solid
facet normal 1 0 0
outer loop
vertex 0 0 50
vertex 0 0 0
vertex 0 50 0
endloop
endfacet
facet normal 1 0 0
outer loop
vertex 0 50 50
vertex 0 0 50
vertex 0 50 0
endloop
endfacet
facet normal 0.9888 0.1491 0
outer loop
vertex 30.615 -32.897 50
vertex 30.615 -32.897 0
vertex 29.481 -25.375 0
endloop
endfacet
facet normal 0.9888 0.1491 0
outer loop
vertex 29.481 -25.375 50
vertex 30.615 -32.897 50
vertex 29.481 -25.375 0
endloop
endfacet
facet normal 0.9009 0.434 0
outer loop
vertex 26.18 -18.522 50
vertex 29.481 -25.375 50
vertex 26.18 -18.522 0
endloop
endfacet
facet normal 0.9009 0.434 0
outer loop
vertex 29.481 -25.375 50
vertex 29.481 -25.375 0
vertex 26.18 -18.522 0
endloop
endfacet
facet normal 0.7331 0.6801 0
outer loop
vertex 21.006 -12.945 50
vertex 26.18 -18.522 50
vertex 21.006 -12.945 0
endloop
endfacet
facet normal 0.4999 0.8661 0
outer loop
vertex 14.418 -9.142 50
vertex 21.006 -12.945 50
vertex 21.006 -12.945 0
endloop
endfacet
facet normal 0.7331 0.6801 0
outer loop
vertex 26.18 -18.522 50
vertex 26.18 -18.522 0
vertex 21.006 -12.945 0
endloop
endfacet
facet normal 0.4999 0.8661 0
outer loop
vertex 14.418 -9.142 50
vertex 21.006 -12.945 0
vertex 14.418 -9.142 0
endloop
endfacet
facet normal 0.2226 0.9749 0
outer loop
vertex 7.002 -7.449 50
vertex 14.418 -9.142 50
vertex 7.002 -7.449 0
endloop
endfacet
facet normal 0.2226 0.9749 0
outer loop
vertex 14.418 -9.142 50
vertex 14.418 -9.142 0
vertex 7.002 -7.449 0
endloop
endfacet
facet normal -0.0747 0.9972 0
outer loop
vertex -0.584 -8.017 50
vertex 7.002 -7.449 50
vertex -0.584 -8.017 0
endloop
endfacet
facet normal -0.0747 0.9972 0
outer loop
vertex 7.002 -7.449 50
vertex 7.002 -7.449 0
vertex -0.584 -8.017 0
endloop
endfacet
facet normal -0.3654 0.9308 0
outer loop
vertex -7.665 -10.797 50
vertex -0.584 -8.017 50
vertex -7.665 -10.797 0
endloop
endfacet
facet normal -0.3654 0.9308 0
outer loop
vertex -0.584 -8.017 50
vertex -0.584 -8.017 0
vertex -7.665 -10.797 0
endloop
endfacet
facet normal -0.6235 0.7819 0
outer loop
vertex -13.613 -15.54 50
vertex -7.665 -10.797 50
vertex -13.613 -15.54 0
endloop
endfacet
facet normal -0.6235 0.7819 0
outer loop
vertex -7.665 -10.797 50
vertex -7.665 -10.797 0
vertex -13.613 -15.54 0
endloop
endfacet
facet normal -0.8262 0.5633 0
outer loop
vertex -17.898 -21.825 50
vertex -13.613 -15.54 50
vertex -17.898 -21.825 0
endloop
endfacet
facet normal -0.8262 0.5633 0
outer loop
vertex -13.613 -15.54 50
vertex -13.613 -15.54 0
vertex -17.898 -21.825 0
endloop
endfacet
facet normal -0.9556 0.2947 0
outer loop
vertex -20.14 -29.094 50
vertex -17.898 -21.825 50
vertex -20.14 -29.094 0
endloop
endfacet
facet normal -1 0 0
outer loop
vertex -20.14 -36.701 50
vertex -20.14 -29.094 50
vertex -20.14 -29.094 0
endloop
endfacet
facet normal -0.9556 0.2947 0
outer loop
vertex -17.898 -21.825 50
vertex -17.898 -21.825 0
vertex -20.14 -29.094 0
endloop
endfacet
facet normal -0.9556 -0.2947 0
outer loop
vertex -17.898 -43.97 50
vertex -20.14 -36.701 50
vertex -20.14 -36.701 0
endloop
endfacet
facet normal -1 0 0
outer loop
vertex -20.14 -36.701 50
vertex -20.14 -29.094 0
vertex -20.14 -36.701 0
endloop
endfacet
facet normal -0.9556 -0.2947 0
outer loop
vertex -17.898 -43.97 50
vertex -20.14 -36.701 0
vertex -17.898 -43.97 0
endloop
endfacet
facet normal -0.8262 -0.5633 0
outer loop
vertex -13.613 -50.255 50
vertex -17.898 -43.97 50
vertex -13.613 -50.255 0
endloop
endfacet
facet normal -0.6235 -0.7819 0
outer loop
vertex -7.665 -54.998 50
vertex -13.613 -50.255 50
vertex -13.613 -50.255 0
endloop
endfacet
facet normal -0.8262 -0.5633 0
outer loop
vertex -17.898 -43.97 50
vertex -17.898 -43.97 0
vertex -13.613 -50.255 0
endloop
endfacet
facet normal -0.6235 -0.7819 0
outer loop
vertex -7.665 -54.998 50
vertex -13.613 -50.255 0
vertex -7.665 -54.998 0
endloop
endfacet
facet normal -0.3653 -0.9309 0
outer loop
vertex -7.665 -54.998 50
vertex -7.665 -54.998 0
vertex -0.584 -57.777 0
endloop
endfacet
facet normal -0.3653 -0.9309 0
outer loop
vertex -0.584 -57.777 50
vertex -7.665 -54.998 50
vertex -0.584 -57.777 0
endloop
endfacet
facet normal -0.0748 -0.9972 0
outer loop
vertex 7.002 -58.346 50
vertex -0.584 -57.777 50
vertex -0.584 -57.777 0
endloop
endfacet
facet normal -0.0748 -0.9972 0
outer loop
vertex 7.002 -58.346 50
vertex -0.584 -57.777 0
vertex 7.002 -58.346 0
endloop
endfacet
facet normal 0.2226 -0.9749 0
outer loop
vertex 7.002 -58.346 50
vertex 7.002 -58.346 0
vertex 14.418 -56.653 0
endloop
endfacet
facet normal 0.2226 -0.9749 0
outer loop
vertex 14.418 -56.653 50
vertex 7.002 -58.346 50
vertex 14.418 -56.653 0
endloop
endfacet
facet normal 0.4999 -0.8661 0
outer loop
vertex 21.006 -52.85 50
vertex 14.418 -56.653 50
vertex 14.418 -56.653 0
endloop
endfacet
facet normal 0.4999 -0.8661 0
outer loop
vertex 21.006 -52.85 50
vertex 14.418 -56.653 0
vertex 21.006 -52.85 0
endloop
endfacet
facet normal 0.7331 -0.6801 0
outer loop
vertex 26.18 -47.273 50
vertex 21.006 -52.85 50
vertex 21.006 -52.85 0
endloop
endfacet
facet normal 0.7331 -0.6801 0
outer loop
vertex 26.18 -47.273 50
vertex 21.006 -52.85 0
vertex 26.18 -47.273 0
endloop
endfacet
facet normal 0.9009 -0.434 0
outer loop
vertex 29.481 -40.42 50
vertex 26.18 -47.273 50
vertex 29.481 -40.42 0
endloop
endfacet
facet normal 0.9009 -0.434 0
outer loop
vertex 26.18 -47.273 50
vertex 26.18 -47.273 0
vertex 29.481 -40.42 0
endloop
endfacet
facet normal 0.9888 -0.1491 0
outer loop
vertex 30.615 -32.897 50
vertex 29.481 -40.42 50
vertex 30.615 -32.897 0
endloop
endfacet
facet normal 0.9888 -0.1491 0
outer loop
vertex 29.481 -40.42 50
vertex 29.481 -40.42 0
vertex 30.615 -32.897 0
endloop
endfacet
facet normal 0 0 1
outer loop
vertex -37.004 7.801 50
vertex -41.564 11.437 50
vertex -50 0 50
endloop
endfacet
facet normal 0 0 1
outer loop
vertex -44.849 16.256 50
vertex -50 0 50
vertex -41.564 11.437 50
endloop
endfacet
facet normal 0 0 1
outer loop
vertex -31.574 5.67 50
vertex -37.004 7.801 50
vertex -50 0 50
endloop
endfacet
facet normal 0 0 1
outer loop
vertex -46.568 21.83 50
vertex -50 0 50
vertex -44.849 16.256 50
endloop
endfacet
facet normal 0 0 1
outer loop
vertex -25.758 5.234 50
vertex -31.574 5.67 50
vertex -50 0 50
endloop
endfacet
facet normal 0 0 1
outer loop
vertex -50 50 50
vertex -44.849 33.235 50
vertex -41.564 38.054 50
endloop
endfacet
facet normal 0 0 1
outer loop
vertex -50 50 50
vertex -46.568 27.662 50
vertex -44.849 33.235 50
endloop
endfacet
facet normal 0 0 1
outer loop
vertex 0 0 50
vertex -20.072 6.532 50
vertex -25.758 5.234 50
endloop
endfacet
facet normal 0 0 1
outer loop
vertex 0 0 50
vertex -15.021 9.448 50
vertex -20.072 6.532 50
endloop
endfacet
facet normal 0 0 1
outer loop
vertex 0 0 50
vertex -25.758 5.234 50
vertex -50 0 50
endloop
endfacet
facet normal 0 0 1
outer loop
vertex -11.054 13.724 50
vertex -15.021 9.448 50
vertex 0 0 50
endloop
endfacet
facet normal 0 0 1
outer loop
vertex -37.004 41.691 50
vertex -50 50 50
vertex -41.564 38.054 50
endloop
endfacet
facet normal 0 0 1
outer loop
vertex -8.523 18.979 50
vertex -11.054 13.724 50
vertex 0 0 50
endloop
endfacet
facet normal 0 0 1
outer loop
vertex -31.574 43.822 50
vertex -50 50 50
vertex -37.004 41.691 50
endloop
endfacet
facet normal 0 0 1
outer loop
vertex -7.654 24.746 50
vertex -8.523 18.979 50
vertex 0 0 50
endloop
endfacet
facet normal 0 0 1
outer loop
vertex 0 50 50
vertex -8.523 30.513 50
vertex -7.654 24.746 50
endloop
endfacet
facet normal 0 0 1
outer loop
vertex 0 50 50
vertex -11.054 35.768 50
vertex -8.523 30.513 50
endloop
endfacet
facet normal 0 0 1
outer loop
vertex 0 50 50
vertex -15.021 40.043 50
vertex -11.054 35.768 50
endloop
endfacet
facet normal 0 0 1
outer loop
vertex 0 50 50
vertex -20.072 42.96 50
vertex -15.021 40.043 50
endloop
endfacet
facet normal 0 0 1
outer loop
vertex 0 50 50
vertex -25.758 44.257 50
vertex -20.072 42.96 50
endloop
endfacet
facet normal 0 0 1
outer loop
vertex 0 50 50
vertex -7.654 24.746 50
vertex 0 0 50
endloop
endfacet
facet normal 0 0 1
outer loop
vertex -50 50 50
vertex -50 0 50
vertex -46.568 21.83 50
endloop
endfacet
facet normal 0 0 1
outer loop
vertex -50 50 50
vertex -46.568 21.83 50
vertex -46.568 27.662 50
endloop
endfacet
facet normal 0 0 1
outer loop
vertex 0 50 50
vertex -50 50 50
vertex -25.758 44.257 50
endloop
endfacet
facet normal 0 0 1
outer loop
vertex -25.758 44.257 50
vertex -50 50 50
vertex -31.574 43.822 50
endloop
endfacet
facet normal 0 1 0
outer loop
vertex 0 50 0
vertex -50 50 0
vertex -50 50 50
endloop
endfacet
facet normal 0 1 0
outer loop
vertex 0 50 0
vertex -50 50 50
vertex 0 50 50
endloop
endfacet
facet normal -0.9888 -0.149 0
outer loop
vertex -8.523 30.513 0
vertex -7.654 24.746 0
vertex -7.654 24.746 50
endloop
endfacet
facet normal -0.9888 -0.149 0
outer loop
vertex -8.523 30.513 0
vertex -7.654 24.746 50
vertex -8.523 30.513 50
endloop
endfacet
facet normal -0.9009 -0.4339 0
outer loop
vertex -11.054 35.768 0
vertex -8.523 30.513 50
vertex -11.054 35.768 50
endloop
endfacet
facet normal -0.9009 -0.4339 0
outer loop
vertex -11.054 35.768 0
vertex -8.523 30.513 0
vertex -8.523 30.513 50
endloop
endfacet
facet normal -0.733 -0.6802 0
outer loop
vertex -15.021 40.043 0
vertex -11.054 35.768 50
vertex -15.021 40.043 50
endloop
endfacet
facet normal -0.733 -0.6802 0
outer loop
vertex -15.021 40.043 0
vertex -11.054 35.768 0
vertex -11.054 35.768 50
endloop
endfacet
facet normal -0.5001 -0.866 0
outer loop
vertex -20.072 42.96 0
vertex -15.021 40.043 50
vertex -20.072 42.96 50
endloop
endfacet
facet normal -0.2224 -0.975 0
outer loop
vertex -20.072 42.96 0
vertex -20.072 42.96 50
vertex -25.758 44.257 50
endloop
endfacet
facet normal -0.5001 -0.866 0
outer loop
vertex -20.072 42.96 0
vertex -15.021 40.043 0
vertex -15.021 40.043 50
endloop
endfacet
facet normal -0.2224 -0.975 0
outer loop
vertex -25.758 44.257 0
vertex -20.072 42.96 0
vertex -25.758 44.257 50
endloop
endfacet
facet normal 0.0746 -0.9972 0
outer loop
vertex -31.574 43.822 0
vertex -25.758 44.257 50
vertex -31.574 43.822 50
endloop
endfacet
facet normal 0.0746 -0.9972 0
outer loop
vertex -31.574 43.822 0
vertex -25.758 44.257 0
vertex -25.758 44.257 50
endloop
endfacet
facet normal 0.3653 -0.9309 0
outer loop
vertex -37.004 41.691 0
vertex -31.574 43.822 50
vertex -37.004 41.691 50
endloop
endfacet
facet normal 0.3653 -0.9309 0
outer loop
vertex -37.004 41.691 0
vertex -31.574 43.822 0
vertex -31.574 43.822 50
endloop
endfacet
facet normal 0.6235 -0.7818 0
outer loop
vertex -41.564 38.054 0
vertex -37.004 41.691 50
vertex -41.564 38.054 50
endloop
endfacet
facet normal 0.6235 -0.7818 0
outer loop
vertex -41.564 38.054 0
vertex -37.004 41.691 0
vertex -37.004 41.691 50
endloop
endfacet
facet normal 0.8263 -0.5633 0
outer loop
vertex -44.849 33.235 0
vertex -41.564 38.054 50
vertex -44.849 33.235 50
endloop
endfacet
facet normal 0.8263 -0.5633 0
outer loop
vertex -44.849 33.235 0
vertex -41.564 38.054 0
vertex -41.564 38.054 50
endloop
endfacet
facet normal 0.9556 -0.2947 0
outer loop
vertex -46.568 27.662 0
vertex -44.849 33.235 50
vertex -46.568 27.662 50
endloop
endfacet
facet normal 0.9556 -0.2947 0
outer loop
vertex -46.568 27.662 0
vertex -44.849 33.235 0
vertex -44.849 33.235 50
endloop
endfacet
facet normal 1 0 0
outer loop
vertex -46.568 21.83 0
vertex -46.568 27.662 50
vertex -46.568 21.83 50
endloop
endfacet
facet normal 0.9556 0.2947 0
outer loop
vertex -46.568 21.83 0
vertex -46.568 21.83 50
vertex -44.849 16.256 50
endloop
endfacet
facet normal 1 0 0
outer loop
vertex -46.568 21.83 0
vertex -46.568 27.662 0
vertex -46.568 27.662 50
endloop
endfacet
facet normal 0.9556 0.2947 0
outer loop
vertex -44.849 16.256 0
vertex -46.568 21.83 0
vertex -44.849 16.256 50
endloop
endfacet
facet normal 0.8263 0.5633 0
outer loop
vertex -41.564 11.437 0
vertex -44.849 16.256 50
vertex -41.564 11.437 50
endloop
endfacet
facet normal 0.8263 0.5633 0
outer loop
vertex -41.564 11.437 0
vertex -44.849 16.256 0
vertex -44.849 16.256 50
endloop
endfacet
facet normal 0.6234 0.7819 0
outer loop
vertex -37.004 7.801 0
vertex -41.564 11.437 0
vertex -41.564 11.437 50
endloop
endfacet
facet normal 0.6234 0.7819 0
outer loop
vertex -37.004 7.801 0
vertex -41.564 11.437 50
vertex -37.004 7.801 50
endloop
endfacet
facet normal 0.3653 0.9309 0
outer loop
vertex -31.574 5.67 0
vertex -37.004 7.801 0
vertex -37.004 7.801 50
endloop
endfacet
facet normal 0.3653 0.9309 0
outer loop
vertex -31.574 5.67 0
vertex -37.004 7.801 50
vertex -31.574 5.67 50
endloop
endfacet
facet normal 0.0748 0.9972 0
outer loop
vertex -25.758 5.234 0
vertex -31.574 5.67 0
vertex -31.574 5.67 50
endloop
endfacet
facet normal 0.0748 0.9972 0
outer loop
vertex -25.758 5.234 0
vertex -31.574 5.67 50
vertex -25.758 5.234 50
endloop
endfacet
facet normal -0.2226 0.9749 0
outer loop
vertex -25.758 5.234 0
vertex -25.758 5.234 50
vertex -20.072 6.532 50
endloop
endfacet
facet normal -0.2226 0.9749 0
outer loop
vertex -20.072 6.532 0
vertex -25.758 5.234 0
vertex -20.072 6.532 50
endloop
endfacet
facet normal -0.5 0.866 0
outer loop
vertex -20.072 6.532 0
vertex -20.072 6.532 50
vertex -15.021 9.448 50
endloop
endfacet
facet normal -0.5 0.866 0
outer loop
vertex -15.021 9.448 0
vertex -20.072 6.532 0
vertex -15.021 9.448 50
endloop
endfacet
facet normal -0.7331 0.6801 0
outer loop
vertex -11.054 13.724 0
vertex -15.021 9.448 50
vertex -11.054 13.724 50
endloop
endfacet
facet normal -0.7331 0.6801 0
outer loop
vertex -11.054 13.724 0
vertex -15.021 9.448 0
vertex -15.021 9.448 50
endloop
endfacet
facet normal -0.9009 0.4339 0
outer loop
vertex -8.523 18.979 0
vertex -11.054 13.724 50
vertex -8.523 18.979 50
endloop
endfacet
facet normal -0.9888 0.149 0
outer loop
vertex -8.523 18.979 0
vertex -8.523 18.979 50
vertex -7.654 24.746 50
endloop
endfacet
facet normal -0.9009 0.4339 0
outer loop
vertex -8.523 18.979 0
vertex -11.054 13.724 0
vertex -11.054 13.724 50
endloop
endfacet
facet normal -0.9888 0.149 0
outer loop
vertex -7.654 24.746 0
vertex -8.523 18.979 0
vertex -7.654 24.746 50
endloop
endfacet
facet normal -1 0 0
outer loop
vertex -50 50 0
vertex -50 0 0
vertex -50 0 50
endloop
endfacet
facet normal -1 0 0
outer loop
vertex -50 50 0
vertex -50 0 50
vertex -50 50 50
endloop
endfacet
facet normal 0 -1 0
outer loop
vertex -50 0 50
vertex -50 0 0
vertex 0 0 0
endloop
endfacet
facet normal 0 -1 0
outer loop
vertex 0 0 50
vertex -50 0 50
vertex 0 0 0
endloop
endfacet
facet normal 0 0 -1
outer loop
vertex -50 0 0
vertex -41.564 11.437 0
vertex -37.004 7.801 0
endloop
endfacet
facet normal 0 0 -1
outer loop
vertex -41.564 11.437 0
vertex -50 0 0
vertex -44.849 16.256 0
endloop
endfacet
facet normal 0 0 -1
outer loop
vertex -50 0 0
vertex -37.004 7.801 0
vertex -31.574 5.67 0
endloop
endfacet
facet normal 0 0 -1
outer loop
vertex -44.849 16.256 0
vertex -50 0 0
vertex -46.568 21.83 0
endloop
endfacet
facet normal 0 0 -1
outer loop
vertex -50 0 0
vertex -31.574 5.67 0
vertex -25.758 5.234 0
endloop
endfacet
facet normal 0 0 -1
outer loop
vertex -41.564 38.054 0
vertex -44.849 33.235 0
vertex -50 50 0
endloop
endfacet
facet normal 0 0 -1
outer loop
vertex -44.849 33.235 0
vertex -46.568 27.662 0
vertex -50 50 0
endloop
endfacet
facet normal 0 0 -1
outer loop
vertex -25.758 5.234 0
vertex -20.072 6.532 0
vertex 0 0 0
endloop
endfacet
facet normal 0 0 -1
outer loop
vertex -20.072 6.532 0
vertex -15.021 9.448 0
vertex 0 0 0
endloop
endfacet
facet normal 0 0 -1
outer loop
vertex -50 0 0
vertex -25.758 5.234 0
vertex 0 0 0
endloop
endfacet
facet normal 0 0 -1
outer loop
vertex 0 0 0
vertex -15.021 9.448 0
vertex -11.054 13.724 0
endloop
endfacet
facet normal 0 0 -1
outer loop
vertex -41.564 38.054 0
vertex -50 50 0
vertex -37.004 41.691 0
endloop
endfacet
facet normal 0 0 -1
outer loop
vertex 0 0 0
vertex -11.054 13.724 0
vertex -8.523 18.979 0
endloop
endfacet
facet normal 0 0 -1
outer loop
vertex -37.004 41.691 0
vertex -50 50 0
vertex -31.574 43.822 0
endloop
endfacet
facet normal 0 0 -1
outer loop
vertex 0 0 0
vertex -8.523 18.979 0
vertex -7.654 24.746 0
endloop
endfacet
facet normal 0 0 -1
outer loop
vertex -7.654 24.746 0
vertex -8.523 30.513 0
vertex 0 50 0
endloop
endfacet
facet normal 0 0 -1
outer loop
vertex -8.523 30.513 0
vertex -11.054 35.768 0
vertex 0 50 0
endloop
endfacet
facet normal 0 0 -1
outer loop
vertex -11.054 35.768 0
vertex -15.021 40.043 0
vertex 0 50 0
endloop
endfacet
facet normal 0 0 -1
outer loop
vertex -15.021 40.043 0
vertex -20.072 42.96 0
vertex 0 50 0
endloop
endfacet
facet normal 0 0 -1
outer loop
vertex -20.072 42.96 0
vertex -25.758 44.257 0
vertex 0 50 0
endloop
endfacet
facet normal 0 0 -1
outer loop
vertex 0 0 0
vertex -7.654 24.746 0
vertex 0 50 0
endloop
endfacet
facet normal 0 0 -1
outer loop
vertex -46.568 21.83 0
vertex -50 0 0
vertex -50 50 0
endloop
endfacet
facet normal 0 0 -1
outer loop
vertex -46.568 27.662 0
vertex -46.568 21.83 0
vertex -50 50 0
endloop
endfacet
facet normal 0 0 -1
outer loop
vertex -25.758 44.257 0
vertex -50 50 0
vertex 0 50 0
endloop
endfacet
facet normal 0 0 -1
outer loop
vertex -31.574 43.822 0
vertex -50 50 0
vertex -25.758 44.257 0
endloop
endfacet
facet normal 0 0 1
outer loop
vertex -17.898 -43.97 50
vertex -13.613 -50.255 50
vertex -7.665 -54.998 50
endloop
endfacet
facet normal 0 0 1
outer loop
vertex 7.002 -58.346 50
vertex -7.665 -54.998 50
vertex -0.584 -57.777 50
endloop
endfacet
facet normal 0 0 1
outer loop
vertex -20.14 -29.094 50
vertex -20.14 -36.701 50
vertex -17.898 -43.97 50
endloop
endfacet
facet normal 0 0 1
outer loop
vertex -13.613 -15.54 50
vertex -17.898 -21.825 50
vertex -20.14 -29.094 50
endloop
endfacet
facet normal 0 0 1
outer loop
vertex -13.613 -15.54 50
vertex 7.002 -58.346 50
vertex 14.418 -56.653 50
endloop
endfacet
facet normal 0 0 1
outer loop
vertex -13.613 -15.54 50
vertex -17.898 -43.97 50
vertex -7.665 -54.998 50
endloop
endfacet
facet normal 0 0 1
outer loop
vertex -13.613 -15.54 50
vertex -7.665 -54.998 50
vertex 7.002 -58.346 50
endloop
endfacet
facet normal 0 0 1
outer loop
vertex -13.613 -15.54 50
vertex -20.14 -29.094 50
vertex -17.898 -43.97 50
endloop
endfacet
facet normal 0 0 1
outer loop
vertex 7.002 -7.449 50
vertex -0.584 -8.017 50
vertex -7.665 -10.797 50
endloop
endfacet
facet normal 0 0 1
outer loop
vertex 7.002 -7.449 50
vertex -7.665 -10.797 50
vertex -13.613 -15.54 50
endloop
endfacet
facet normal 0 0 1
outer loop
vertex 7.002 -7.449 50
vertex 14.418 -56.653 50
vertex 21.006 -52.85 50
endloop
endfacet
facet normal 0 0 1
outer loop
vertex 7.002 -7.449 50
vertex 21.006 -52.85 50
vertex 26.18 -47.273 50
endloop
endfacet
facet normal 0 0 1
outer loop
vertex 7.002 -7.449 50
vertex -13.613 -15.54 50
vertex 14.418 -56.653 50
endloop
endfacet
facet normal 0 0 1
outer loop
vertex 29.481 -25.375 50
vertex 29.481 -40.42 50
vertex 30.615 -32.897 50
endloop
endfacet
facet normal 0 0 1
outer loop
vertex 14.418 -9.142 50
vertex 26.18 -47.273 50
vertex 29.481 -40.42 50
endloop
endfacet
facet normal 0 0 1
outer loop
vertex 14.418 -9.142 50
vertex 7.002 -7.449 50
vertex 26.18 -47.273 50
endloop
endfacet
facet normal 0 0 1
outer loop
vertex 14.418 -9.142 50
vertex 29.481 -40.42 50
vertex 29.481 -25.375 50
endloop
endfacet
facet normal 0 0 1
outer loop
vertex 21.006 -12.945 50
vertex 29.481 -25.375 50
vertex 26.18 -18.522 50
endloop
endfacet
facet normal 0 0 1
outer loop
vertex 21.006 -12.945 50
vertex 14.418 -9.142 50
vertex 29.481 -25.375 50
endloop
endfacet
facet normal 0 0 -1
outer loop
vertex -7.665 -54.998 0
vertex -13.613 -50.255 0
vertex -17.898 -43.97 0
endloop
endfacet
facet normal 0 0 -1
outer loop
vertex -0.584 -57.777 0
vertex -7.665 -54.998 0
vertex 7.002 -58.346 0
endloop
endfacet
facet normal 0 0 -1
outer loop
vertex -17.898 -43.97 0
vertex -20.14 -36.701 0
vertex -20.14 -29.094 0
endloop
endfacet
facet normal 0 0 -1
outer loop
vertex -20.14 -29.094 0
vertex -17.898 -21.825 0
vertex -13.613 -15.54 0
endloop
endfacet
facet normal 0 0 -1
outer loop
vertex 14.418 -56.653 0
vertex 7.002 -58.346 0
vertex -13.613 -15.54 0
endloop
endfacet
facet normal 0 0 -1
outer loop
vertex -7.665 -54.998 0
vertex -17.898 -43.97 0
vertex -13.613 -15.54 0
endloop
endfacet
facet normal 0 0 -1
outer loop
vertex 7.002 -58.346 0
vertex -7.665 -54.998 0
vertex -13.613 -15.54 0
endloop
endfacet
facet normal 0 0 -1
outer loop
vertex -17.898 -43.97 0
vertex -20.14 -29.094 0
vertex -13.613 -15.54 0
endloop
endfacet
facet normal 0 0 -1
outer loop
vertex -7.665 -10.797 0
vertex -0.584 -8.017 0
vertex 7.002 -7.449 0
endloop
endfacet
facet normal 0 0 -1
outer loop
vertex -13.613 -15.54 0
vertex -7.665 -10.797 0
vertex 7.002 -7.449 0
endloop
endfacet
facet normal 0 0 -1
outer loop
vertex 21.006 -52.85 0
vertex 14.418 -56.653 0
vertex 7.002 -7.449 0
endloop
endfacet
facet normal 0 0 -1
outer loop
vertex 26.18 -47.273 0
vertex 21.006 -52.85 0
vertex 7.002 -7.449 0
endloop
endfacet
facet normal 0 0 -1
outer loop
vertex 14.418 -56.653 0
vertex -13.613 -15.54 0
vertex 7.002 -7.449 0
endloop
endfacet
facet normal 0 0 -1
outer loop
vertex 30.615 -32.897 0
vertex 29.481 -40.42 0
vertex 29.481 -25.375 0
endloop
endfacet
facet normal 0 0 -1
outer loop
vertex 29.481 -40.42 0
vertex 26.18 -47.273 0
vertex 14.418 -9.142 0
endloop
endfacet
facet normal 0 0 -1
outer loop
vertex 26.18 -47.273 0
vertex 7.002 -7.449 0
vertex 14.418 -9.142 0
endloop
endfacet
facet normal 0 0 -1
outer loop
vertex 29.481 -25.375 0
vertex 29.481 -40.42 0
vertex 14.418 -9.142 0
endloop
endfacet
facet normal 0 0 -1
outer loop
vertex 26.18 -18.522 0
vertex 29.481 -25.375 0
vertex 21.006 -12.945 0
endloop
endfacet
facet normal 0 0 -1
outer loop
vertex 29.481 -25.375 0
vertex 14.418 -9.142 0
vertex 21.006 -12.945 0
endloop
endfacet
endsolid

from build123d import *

# Parameters (mm, degrees)
F0_W     = 50
F0_H     = 50
F1_DEPTH = 50
F2_R     = 25.5197850682
F3_DEPTH = 50
F4_R     = 14.9130073931
F5_DEPTH = 50
F6_R     = 19.5662835943
F7_DEPTH = 50


with BuildPart() as f1:
    # F0 (on Top) → F1 (new body)
    with BuildSketch(Plane.XY):
        with Locations((-25, 25)):
            Rectangle(F0_W, F0_H)
    extrude(amount=F1_DEPTH)

    # F4 (on Top) → F5 (cut)
    with BuildSketch(Plane.XY):
        with Locations((-28.0938092619, 25.0369701535)):
            Circle(F4_R)
    extrude(amount=-F5_DEPTH, mode=Mode.SUBTRACT)

    # F6 (on Top) → F7 (cut)
    with BuildSketch(Plane.XY):
        with Locations((-27.2204261273, 24.7458424419)):
            Circle(F6_R)
    extrude(amount=F7_DEPTH, mode=Mode.SUBTRACT)


with BuildPart() as f3:
    # F2 (on Top) → F3 (new body)
    with BuildSketch(Plane.XY):
        with Locations((5.0947340205, -32.8974127769)):
            Circle(F2_R)
    extrude(amount=F3_DEPTH)


solid = Compound([f1.part, f3.part])
